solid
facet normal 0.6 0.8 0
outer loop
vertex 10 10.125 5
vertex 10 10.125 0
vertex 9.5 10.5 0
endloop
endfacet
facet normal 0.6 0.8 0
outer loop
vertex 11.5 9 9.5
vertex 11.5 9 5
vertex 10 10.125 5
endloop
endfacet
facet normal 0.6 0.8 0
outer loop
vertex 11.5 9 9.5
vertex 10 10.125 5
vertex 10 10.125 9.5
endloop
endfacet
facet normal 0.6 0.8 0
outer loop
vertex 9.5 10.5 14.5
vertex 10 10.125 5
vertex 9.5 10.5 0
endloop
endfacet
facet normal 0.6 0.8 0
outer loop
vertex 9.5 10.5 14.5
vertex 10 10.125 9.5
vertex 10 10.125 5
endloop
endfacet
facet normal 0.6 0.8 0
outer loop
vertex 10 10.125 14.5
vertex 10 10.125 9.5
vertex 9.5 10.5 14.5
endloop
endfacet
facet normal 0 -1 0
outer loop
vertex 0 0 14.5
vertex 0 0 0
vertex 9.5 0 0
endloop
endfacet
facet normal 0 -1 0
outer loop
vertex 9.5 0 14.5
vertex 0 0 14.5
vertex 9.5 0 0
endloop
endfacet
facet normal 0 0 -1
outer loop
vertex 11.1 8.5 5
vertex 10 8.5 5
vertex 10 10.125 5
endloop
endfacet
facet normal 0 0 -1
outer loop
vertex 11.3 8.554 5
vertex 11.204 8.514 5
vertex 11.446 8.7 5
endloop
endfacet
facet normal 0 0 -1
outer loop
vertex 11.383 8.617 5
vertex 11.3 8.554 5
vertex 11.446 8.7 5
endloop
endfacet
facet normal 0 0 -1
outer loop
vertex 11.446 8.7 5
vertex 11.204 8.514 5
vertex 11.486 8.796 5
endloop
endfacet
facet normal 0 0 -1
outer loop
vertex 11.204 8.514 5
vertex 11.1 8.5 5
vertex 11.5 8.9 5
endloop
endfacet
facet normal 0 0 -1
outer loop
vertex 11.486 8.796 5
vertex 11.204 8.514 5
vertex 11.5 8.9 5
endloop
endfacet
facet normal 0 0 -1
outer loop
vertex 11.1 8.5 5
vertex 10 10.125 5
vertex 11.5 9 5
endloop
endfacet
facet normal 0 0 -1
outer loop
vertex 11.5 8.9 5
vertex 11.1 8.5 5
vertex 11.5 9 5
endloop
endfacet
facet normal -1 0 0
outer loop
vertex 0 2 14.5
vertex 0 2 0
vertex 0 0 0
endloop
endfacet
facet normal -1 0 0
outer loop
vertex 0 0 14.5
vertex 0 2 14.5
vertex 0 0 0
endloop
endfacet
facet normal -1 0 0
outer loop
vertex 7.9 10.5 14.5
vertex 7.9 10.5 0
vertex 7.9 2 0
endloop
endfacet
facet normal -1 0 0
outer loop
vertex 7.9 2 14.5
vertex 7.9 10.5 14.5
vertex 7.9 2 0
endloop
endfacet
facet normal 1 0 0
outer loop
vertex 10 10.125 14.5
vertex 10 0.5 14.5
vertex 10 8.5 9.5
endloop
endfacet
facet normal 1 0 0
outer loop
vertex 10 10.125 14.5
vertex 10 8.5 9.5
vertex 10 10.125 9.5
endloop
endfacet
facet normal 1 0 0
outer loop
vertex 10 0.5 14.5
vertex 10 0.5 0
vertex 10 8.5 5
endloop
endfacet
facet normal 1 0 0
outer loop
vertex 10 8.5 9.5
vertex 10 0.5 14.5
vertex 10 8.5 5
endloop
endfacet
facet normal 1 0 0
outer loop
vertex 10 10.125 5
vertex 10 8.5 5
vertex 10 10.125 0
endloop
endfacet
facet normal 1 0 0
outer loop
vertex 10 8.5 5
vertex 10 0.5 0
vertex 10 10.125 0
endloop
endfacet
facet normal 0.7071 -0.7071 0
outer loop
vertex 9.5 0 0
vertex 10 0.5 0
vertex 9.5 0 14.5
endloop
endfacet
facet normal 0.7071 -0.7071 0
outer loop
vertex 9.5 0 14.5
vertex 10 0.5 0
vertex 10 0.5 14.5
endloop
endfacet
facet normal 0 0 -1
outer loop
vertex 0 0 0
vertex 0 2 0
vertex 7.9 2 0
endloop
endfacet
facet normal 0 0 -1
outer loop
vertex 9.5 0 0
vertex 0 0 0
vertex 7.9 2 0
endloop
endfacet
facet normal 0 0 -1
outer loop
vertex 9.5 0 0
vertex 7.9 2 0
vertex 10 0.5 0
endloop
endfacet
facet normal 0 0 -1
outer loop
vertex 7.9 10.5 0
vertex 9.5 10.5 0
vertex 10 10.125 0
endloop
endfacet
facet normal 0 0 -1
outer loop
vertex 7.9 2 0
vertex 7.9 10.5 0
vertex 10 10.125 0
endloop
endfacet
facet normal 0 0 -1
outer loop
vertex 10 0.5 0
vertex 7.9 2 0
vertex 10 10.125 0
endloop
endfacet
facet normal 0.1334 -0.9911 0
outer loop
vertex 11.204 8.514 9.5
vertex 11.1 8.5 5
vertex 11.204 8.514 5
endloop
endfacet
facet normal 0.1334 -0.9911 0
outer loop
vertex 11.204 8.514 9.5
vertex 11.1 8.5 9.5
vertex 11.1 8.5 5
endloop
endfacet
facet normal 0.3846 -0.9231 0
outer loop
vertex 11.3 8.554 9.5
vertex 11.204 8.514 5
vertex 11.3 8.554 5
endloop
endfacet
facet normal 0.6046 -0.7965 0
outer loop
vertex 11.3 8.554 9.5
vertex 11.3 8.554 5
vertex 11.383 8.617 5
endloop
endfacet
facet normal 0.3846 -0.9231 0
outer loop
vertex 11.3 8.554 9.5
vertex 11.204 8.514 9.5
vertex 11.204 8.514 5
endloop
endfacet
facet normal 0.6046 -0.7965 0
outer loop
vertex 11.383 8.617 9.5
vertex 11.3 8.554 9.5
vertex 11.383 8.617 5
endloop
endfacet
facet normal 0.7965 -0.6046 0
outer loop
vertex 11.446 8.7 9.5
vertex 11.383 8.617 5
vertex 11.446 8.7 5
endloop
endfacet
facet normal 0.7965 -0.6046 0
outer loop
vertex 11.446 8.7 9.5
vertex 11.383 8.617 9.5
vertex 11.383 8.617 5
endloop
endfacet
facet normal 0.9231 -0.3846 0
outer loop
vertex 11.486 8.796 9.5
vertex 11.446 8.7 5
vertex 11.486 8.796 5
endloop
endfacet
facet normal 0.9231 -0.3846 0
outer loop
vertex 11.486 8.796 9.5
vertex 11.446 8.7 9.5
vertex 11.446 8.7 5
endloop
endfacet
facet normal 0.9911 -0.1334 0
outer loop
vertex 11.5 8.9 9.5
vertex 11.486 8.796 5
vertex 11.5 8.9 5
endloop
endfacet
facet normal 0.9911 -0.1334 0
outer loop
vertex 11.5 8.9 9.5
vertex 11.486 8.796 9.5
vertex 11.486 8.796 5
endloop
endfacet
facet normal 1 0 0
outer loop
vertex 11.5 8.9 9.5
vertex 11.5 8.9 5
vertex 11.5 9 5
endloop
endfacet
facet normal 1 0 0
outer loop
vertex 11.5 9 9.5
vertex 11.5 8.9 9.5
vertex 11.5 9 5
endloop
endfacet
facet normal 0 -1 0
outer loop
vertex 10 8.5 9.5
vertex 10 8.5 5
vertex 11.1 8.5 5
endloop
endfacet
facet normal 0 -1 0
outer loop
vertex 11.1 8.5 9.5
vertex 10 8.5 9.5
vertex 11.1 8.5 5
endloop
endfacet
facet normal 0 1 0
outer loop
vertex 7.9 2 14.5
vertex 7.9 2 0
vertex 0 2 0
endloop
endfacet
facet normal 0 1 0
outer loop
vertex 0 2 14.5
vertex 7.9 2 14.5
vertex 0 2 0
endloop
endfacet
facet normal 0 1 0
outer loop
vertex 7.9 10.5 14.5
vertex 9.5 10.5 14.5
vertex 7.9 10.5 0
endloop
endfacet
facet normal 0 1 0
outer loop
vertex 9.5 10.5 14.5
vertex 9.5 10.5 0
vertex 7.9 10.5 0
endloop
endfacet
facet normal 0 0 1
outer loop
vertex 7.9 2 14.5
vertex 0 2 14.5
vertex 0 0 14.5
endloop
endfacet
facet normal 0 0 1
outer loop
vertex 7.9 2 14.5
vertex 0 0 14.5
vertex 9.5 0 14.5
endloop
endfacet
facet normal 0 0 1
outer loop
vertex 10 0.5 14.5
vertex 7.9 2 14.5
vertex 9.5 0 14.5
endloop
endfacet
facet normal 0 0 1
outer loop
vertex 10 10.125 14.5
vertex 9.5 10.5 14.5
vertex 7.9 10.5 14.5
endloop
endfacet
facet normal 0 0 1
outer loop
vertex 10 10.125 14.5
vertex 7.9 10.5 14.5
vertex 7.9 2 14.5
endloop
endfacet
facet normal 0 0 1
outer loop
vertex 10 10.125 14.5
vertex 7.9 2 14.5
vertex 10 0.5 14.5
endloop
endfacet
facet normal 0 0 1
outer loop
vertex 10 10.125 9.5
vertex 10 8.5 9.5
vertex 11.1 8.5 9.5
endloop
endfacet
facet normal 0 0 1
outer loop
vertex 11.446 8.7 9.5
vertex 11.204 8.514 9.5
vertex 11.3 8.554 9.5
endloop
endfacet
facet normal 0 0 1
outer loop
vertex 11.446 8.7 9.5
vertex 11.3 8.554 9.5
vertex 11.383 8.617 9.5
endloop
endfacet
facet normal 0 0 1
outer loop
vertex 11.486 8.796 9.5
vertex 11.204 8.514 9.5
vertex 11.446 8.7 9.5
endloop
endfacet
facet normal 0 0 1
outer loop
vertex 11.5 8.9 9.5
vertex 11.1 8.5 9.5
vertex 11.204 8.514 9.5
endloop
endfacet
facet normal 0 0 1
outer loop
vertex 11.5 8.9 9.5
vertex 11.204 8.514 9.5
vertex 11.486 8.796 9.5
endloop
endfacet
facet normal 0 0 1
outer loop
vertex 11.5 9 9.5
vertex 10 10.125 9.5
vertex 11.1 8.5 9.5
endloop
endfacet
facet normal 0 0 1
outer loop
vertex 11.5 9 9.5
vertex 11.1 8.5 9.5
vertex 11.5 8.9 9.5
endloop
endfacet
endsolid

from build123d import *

# Parameters (mm, degrees)
F1_DEPTH = 14.5
F2_START = 5
F0_W     = 1.5
F0_H     = 2
F2_DEPTH = 4.5
F3_SIZE  = 0.5
F4_SIZE2 = 1.5
F4_SIZE  = 2
F5_R     = 0.4


with BuildPart() as f1:
    # F0 (on Top) → F1 (new body)
    with BuildSketch(Plane.XY):
        Polygon((0, 2), (0, 0), (10, 0), (10, 8.5), (10, 10.5), (7.9, 10.5), (7.9, 2), align=None)
    extrude(amount=F1_DEPTH)

    # F0 (on Top) → F2 (join)
    with BuildSketch(Plane.XY.offset(F2_START)):
        with Locations((10.75, 9.5)):
            Rectangle(F0_W, F0_H)
    extrude(amount=F2_DEPTH)

    # F3
    f3_edges = [f1.edges().sort_by_distance(p)[0] for p in [
        (10, 0, 7.25),
    ]]
    chamfer(f3_edges, length=F3_SIZE)

    # F4
    f4_edges = [f1.edges().sort_by_distance(p)[0] for p in [
        (11.5, 10.5, 7.25),
    ]]
    f4_side = f1.faces().sort_by_distance((9.276613, 10.5, 7.25))[0]
    chamfer(f4_edges, length=F4_SIZE, length2=F4_SIZE2, reference=f4_side)

    # F5
    f5_edges = [f1.edges().sort_by_distance(p)[0] for p in [
        (11.5, 8.5, 7.25),
    ]]
    fillet(f5_edges, radius=F5_R)


solid = f1.part
